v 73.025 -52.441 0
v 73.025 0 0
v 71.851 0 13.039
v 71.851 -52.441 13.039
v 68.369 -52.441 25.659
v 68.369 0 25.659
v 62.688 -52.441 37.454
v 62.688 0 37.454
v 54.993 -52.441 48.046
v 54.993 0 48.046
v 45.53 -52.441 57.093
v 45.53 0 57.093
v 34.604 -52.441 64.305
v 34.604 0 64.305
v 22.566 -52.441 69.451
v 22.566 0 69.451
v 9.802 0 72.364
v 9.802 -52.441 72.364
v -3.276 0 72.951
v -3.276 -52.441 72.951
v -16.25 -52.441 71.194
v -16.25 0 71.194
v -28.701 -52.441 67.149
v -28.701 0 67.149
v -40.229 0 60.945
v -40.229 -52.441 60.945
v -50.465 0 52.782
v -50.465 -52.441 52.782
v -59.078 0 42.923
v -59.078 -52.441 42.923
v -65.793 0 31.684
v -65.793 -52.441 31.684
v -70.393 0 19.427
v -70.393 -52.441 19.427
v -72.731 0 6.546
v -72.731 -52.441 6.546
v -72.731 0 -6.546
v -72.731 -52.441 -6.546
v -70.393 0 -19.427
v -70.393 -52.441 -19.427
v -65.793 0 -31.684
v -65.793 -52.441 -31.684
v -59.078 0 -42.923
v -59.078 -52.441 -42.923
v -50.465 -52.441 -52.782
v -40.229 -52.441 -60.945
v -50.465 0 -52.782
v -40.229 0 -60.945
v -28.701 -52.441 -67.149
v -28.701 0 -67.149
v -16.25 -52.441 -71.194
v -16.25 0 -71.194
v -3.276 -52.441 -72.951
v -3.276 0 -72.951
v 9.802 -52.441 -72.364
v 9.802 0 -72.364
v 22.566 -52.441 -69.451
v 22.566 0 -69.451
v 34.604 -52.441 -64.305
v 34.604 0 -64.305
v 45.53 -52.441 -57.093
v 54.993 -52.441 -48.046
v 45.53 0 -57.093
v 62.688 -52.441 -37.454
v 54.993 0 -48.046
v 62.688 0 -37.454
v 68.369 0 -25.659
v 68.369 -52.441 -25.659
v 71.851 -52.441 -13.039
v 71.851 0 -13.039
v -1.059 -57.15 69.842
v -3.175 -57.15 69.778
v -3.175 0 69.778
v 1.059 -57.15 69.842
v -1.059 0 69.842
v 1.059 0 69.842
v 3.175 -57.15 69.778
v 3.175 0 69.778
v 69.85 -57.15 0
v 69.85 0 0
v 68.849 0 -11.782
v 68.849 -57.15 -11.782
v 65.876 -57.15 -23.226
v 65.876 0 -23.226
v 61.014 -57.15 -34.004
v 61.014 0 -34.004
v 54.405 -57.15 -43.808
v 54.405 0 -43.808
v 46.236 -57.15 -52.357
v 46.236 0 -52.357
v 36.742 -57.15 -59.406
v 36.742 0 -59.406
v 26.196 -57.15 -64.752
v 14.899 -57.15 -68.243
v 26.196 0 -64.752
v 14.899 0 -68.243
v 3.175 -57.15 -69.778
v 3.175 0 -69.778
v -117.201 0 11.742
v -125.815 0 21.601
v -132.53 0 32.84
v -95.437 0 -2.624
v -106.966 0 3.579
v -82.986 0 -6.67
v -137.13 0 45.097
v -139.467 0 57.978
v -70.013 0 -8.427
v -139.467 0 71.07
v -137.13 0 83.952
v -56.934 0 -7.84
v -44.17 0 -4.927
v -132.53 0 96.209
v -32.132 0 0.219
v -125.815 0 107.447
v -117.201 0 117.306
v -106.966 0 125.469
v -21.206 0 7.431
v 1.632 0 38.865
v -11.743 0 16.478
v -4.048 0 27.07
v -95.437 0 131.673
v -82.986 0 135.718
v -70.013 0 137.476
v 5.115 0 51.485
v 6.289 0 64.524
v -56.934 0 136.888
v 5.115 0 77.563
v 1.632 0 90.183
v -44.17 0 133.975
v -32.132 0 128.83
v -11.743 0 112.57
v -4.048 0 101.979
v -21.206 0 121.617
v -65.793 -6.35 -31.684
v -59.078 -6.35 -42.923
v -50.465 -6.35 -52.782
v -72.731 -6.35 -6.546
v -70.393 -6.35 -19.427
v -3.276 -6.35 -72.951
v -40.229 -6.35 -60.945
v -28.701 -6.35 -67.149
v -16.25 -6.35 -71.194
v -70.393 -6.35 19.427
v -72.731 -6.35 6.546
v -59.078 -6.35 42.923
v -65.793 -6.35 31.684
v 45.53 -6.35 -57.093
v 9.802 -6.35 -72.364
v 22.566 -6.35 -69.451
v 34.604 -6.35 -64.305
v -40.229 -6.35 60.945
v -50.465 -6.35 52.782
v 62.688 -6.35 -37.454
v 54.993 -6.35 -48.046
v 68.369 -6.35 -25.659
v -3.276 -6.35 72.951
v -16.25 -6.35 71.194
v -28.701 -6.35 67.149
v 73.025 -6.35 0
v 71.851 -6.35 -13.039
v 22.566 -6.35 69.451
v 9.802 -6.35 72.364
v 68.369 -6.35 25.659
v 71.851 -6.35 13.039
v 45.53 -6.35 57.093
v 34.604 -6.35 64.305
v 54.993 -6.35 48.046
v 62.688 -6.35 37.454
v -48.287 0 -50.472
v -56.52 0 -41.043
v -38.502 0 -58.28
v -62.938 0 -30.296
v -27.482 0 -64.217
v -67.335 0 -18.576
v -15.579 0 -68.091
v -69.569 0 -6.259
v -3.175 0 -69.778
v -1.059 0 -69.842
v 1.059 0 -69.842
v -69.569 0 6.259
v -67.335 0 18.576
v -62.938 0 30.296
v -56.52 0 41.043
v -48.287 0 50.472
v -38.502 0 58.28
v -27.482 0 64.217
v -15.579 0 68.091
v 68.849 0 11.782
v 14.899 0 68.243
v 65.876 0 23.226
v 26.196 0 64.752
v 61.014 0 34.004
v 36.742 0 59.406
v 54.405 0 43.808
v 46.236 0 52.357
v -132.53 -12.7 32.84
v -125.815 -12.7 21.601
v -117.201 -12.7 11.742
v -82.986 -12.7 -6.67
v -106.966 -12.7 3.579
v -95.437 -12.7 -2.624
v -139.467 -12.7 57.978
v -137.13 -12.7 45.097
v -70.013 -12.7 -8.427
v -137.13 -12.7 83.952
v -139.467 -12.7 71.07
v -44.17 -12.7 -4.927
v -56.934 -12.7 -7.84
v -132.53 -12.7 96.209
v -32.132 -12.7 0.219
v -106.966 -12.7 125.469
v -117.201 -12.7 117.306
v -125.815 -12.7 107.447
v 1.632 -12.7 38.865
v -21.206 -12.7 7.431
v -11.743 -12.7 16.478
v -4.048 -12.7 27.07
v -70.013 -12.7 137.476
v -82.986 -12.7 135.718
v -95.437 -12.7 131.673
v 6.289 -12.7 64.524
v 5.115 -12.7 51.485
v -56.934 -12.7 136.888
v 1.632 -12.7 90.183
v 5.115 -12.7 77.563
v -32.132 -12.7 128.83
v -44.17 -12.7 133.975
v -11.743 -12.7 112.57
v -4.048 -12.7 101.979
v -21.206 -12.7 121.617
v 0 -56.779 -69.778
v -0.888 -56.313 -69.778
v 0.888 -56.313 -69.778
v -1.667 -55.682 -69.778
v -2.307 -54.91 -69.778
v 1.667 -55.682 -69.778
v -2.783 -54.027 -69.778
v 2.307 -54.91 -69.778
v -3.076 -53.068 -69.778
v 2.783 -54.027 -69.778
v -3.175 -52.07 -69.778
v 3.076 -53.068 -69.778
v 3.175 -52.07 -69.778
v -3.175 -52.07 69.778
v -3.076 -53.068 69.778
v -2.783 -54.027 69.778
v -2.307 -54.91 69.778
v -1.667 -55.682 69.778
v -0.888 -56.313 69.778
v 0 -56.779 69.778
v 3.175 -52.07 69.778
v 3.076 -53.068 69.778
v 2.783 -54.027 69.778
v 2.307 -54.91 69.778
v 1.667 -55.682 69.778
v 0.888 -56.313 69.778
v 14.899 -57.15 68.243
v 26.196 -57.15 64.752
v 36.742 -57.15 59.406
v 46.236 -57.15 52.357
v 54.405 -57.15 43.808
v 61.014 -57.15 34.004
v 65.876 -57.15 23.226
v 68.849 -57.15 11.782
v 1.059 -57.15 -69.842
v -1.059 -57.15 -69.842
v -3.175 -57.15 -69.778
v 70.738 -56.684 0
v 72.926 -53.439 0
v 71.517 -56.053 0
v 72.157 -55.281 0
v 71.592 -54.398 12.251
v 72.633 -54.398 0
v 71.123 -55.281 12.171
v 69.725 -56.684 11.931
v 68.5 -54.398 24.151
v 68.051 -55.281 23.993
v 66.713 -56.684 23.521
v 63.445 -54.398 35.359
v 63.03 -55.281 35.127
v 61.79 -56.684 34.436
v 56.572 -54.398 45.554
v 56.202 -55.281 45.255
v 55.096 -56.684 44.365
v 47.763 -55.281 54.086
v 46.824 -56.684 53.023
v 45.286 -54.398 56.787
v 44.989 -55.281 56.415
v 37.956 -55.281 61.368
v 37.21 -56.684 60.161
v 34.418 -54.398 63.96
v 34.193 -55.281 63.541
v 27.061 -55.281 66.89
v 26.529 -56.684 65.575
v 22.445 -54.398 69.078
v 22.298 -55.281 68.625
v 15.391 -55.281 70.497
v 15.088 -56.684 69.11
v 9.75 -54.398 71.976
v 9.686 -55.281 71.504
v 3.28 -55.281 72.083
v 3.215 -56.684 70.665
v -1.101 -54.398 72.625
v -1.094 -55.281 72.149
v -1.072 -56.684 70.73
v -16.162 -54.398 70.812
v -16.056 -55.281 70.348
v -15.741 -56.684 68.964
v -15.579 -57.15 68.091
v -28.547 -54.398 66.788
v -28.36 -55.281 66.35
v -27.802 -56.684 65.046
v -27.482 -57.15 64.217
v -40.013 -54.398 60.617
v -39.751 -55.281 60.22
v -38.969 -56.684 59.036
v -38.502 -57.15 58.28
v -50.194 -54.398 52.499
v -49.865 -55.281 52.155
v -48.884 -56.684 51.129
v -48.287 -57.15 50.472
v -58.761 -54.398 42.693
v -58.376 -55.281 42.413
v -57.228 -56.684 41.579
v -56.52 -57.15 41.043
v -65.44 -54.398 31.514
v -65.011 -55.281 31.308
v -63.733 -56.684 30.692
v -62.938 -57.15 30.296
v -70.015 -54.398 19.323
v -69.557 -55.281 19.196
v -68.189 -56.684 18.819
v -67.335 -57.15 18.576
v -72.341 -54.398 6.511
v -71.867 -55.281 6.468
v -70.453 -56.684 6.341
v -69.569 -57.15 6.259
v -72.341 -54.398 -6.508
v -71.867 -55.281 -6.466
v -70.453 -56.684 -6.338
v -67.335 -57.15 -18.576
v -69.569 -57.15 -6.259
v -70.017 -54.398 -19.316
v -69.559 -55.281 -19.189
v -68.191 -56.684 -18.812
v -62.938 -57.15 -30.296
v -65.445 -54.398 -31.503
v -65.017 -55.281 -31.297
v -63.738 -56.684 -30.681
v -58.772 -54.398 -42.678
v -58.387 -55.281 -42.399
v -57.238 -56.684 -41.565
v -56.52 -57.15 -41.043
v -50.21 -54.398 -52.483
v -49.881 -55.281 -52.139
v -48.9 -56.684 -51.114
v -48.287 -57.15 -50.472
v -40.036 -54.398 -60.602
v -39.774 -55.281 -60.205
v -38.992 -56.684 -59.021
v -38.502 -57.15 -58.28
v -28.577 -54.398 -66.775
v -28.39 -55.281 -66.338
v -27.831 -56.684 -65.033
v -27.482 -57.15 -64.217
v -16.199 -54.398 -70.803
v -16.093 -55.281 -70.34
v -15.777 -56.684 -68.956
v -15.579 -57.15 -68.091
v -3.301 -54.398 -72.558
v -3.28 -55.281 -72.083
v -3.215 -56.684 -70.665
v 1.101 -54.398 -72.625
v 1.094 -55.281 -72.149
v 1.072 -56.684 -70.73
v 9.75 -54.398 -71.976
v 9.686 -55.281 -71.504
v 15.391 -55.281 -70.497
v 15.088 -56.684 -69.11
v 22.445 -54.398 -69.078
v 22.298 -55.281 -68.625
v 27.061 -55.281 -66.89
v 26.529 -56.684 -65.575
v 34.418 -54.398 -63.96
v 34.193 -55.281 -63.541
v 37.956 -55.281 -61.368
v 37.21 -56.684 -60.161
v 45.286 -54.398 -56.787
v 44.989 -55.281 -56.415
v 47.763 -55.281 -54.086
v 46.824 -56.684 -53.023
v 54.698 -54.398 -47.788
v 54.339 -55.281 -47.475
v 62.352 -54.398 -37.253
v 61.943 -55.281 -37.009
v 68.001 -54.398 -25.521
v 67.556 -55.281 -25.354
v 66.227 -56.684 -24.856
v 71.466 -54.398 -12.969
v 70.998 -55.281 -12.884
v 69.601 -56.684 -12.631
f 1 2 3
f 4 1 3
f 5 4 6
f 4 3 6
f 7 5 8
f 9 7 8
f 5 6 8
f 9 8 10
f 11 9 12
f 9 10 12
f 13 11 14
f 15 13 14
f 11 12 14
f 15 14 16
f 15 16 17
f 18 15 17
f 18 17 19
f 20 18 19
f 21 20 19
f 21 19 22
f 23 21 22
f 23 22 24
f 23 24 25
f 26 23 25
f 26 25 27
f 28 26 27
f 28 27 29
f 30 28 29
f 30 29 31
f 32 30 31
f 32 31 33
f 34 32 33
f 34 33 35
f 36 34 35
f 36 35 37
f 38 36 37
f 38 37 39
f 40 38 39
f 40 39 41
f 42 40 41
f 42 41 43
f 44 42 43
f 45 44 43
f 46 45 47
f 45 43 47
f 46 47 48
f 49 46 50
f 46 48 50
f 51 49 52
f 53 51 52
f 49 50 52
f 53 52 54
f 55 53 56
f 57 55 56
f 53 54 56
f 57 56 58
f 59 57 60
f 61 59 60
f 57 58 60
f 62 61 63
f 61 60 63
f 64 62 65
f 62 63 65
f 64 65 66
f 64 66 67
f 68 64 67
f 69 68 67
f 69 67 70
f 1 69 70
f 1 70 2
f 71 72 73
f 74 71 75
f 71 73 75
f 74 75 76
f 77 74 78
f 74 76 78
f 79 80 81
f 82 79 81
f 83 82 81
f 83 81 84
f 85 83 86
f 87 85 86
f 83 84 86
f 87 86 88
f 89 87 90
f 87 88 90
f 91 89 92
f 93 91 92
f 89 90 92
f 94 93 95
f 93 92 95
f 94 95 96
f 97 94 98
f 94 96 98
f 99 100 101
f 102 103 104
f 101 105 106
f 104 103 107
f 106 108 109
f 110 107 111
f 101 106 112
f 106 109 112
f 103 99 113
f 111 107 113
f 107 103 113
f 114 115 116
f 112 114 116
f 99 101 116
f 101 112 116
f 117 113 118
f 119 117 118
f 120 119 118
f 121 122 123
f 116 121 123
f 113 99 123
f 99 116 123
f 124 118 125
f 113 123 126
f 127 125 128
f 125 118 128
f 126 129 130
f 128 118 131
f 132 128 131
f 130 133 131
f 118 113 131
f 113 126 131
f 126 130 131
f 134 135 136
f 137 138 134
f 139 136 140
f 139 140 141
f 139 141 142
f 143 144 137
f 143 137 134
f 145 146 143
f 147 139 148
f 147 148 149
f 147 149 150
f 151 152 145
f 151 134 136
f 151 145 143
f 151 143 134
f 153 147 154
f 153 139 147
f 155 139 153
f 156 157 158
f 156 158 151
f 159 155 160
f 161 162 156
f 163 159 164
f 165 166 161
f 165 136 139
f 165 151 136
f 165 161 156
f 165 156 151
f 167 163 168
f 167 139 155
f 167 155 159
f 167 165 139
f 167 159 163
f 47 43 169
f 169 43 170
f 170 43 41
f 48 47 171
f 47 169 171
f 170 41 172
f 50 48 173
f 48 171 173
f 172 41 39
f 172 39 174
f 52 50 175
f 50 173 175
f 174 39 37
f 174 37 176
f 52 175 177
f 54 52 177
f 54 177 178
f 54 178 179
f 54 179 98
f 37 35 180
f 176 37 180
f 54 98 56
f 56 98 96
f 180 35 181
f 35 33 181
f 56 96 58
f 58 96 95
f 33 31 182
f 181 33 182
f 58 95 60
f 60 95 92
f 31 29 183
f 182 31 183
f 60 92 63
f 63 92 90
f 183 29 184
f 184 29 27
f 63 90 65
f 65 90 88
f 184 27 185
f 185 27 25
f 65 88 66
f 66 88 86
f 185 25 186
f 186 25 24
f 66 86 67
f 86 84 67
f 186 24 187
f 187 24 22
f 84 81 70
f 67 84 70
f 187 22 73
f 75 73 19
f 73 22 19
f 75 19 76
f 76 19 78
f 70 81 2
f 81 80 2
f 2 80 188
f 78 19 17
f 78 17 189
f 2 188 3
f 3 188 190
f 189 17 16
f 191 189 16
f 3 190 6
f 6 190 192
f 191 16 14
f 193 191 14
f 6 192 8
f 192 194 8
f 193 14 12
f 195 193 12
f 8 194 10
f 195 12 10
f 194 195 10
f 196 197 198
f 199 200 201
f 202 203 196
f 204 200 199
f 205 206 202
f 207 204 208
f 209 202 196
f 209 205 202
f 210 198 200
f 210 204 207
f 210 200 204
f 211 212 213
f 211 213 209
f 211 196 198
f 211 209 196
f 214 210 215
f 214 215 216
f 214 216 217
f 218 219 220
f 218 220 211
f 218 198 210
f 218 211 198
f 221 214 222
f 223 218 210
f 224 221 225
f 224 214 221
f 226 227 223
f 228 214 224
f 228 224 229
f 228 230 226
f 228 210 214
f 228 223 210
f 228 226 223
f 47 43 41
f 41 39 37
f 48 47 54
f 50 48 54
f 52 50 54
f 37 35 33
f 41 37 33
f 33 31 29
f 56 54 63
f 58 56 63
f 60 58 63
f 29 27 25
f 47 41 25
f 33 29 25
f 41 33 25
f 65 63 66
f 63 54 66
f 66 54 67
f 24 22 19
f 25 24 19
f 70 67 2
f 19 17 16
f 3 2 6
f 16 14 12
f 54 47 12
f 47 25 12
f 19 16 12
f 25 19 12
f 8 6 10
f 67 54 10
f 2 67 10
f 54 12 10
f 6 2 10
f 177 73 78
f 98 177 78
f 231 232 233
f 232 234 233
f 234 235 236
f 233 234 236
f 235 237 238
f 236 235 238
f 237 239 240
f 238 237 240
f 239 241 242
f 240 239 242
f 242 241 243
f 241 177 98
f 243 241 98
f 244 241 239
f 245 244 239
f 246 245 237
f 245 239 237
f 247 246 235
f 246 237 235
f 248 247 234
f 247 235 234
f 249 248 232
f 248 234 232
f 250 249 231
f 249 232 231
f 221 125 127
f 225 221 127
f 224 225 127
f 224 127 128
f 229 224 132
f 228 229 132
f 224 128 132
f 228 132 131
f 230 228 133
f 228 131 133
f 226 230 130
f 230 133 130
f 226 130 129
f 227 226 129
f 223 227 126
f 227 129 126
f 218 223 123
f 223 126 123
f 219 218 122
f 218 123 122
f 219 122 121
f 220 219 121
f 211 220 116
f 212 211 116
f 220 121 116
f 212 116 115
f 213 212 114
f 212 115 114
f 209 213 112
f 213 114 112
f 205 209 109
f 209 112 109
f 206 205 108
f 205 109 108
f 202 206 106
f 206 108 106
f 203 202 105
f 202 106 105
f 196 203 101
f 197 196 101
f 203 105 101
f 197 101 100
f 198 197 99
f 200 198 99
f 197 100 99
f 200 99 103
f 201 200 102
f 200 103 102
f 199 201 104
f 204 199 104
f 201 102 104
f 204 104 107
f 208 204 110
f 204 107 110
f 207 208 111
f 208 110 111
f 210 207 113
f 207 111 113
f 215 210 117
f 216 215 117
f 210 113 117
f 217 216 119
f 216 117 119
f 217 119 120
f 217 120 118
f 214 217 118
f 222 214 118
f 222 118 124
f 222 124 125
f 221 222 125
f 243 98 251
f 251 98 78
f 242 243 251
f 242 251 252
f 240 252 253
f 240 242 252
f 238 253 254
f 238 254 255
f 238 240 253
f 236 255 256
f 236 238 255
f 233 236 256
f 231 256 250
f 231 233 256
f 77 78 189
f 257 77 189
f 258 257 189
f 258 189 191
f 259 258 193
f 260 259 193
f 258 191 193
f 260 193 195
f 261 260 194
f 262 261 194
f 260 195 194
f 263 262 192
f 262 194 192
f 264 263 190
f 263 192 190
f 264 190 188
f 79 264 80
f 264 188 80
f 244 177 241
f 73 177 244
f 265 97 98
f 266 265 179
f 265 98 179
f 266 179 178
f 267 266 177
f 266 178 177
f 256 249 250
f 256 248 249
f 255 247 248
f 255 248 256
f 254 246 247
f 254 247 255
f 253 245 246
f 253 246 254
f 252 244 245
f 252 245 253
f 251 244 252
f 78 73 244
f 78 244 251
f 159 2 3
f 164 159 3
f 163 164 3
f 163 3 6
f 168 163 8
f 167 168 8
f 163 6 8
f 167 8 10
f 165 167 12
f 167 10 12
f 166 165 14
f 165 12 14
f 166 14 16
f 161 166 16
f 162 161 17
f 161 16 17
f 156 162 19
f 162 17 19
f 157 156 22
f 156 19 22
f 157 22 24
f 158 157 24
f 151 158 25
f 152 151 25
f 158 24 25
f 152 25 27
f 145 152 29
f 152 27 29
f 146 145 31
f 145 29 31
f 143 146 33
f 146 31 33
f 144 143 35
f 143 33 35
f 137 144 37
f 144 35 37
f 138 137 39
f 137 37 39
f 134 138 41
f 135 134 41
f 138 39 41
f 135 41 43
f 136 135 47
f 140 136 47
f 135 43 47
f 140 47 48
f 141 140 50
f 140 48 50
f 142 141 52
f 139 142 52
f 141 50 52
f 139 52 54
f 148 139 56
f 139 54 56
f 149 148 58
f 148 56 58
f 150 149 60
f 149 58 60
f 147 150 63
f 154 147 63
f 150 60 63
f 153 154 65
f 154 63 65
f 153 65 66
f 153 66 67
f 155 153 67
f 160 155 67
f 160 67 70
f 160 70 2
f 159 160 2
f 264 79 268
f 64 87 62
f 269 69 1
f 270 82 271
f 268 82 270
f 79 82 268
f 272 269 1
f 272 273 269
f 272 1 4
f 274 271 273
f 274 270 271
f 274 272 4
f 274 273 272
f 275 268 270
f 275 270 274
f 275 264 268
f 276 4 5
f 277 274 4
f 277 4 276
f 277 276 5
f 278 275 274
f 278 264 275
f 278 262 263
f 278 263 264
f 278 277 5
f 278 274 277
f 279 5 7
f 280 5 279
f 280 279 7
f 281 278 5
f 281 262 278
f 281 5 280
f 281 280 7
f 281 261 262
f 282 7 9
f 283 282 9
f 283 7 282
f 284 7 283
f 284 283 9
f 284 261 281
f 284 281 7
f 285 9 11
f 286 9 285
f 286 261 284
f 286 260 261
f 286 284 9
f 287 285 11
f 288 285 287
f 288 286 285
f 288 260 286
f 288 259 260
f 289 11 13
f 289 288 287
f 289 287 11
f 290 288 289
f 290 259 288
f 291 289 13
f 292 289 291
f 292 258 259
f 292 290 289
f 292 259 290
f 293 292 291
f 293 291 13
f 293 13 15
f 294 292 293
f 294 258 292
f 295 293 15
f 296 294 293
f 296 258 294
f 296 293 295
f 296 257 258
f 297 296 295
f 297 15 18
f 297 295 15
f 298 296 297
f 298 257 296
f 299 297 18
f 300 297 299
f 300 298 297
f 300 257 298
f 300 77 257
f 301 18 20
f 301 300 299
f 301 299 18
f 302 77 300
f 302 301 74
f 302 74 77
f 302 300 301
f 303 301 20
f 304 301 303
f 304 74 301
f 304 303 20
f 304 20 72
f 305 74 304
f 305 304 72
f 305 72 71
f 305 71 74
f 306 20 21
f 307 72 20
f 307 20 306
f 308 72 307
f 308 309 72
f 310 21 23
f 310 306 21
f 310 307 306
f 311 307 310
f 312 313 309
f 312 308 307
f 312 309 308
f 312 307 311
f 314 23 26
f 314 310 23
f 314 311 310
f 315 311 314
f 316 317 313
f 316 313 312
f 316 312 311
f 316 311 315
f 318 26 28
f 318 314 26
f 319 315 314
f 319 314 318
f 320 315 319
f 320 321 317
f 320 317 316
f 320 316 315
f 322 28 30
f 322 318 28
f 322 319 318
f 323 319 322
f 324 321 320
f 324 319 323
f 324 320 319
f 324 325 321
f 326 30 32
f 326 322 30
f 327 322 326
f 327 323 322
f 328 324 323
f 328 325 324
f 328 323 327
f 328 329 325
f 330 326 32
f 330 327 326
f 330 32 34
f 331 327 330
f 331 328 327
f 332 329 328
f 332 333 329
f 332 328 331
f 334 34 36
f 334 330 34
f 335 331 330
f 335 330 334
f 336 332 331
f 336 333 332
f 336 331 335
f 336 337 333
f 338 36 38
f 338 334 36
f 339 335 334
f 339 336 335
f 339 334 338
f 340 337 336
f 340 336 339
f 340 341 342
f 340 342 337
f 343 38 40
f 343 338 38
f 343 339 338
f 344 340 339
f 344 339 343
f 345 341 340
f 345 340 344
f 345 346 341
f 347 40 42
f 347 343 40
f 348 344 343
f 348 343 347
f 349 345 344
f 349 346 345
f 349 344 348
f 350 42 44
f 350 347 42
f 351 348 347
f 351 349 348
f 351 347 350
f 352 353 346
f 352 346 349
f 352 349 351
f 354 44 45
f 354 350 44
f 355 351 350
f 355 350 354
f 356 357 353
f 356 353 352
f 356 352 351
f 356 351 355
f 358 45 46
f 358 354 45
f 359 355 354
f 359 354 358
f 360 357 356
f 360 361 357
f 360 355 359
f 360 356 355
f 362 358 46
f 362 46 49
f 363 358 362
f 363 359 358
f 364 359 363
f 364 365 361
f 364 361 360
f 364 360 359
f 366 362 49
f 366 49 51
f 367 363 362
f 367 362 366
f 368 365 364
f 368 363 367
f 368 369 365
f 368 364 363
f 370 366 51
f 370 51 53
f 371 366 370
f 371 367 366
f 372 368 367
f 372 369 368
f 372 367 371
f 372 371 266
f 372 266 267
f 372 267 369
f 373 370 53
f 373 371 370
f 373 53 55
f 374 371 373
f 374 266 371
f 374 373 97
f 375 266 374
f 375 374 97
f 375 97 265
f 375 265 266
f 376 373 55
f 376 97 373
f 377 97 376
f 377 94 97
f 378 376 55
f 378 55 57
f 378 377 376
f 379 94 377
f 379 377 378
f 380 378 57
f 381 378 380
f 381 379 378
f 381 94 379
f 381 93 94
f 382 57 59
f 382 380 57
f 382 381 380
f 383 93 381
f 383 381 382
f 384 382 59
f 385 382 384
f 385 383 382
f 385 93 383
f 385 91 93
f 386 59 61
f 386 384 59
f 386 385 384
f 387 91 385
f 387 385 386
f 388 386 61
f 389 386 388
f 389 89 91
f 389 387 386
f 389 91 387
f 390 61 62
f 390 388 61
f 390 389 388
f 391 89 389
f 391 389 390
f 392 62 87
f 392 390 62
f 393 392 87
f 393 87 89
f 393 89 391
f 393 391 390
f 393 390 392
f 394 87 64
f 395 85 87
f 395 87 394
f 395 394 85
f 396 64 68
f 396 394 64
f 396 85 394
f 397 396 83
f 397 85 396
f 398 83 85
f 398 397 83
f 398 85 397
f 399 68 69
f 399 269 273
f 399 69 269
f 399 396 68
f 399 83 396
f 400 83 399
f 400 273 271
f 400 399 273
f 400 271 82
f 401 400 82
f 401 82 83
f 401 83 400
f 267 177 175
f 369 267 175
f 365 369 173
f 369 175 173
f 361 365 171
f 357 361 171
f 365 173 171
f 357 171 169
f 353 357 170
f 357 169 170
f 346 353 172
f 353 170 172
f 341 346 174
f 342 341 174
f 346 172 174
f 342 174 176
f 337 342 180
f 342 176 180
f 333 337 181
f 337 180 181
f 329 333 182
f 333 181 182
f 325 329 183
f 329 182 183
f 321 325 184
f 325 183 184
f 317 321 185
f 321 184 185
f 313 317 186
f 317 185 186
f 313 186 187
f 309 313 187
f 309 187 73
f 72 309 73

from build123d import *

# Parameters (mm, degrees)
F0_R          = 73.025
F1_DEPTH      = 57.15
F0_W          = 6.35
F0_H          = 139.5556071966
F2_R          = 73.025
F3_DEPTH      = 6.35
F4_2_T1_DEPTH = 164.9556071966
F5_R          = 73.025
F6_DEPTH      = 12.7


# Not quite as in the source:
# - a fillet or chamfer that OpenCascade refuses, or shapes differently, is made with other operations: its cross-section is extruded or revolved along the edge and cut away or added


with BuildPart() as f1:
    # F0 (on Front) → F1 (new body)
    with BuildSketch(Plane.XZ):
        Circle(F0_R)
        with BuildLine():
            ThreePointArc((3.175, 69.7778035983), (50.5014665629, 48.2558221876), (69.85, 0))
            ThreePointArc((69.85, 0), (50.5014665629, -48.2558221876), (3.175, -69.7778035983))
            ThreePointArc((3.175, -69.7778035983), (0, -69.85), (-3.175, -69.7778035983))
            ThreePointArc((-3.175, -69.7778035983), (-69.85, 0), (-3.175, 69.7778035983))
            ThreePointArc((-3.175, 69.7778035983), (0, 69.85), (3.175, 69.7778035983))
        make_face(mode=Mode.SUBTRACT)
    extrude(amount=F1_DEPTH)

    # F4: fillet of radius 5.08 on 1 edges, made by hand

    # F4_s1 → F4_t2 (revolve, cut)
    with BuildSketch(Plane.XY):
        with BuildLine():
            ThreePointArc((73.025, -52.4407139607), (72.1571134838, -55.2805202921), (69.85, -57.15))
            Line((69.85, -57.15), (73.025, -57.15))
            Line((73.025, -57.15), (73.025, -52.4407139607))
        make_face()
    revolve(axis=Axis((0, -57.15, 0), (0, -1, 0)), mode=Mode.SUBTRACT)


with BuildPart() as f1b:
    # F0 (on Front) → F1, piece 2 (new body)
    with BuildSketch(Plane.XZ):
        Rectangle(F0_W, F0_H)
    extrude(amount=F1_DEPTH)

    # F4#2: fillet of radius 5.08 on 2 edges, made by hand

    # F4_2_s2 → F4_2_t1 (cut)
    with BuildSketch(Plane.XY.offset(-82.4778035983)):
        with BuildLine():
            ThreePointArc((-3.175, -52.07), (-1.6871024484, -55.6621024484), (1.905, -57.15))
            Line((1.905, -57.15), (-3.175, -57.15))
            Line((-3.175, -57.15), (-3.175, -52.07))
        make_face()
        with BuildLine():
            ThreePointArc((3.175, -52.07), (1.6871024484, -55.6621024484), (-1.905, -57.15))
            Line((-1.905, -57.15), (3.175, -57.15))
            Line((3.175, -57.15), (3.175, -52.07))
        make_face()
    extrude(amount=F4_2_T1_DEPTH, mode=Mode.SUBTRACT)


with BuildPart() as f3:
    # F2 (on Front) → F3 (new body)
    with BuildSketch(Plane.XZ):
        Circle(F2_R)
    extrude(amount=F3_DEPTH)


with BuildPart() as f6:
    # F5 (on Front) → F6 (new body)
    with BuildSketch(Plane.XZ):
        with Locations((-66.7364522815, 64.5241960883)):
            Circle(F5_R)
    extrude(amount=F6_DEPTH)


solid = Compound([f1.part, f1b.part, f3.part, f6.part])
